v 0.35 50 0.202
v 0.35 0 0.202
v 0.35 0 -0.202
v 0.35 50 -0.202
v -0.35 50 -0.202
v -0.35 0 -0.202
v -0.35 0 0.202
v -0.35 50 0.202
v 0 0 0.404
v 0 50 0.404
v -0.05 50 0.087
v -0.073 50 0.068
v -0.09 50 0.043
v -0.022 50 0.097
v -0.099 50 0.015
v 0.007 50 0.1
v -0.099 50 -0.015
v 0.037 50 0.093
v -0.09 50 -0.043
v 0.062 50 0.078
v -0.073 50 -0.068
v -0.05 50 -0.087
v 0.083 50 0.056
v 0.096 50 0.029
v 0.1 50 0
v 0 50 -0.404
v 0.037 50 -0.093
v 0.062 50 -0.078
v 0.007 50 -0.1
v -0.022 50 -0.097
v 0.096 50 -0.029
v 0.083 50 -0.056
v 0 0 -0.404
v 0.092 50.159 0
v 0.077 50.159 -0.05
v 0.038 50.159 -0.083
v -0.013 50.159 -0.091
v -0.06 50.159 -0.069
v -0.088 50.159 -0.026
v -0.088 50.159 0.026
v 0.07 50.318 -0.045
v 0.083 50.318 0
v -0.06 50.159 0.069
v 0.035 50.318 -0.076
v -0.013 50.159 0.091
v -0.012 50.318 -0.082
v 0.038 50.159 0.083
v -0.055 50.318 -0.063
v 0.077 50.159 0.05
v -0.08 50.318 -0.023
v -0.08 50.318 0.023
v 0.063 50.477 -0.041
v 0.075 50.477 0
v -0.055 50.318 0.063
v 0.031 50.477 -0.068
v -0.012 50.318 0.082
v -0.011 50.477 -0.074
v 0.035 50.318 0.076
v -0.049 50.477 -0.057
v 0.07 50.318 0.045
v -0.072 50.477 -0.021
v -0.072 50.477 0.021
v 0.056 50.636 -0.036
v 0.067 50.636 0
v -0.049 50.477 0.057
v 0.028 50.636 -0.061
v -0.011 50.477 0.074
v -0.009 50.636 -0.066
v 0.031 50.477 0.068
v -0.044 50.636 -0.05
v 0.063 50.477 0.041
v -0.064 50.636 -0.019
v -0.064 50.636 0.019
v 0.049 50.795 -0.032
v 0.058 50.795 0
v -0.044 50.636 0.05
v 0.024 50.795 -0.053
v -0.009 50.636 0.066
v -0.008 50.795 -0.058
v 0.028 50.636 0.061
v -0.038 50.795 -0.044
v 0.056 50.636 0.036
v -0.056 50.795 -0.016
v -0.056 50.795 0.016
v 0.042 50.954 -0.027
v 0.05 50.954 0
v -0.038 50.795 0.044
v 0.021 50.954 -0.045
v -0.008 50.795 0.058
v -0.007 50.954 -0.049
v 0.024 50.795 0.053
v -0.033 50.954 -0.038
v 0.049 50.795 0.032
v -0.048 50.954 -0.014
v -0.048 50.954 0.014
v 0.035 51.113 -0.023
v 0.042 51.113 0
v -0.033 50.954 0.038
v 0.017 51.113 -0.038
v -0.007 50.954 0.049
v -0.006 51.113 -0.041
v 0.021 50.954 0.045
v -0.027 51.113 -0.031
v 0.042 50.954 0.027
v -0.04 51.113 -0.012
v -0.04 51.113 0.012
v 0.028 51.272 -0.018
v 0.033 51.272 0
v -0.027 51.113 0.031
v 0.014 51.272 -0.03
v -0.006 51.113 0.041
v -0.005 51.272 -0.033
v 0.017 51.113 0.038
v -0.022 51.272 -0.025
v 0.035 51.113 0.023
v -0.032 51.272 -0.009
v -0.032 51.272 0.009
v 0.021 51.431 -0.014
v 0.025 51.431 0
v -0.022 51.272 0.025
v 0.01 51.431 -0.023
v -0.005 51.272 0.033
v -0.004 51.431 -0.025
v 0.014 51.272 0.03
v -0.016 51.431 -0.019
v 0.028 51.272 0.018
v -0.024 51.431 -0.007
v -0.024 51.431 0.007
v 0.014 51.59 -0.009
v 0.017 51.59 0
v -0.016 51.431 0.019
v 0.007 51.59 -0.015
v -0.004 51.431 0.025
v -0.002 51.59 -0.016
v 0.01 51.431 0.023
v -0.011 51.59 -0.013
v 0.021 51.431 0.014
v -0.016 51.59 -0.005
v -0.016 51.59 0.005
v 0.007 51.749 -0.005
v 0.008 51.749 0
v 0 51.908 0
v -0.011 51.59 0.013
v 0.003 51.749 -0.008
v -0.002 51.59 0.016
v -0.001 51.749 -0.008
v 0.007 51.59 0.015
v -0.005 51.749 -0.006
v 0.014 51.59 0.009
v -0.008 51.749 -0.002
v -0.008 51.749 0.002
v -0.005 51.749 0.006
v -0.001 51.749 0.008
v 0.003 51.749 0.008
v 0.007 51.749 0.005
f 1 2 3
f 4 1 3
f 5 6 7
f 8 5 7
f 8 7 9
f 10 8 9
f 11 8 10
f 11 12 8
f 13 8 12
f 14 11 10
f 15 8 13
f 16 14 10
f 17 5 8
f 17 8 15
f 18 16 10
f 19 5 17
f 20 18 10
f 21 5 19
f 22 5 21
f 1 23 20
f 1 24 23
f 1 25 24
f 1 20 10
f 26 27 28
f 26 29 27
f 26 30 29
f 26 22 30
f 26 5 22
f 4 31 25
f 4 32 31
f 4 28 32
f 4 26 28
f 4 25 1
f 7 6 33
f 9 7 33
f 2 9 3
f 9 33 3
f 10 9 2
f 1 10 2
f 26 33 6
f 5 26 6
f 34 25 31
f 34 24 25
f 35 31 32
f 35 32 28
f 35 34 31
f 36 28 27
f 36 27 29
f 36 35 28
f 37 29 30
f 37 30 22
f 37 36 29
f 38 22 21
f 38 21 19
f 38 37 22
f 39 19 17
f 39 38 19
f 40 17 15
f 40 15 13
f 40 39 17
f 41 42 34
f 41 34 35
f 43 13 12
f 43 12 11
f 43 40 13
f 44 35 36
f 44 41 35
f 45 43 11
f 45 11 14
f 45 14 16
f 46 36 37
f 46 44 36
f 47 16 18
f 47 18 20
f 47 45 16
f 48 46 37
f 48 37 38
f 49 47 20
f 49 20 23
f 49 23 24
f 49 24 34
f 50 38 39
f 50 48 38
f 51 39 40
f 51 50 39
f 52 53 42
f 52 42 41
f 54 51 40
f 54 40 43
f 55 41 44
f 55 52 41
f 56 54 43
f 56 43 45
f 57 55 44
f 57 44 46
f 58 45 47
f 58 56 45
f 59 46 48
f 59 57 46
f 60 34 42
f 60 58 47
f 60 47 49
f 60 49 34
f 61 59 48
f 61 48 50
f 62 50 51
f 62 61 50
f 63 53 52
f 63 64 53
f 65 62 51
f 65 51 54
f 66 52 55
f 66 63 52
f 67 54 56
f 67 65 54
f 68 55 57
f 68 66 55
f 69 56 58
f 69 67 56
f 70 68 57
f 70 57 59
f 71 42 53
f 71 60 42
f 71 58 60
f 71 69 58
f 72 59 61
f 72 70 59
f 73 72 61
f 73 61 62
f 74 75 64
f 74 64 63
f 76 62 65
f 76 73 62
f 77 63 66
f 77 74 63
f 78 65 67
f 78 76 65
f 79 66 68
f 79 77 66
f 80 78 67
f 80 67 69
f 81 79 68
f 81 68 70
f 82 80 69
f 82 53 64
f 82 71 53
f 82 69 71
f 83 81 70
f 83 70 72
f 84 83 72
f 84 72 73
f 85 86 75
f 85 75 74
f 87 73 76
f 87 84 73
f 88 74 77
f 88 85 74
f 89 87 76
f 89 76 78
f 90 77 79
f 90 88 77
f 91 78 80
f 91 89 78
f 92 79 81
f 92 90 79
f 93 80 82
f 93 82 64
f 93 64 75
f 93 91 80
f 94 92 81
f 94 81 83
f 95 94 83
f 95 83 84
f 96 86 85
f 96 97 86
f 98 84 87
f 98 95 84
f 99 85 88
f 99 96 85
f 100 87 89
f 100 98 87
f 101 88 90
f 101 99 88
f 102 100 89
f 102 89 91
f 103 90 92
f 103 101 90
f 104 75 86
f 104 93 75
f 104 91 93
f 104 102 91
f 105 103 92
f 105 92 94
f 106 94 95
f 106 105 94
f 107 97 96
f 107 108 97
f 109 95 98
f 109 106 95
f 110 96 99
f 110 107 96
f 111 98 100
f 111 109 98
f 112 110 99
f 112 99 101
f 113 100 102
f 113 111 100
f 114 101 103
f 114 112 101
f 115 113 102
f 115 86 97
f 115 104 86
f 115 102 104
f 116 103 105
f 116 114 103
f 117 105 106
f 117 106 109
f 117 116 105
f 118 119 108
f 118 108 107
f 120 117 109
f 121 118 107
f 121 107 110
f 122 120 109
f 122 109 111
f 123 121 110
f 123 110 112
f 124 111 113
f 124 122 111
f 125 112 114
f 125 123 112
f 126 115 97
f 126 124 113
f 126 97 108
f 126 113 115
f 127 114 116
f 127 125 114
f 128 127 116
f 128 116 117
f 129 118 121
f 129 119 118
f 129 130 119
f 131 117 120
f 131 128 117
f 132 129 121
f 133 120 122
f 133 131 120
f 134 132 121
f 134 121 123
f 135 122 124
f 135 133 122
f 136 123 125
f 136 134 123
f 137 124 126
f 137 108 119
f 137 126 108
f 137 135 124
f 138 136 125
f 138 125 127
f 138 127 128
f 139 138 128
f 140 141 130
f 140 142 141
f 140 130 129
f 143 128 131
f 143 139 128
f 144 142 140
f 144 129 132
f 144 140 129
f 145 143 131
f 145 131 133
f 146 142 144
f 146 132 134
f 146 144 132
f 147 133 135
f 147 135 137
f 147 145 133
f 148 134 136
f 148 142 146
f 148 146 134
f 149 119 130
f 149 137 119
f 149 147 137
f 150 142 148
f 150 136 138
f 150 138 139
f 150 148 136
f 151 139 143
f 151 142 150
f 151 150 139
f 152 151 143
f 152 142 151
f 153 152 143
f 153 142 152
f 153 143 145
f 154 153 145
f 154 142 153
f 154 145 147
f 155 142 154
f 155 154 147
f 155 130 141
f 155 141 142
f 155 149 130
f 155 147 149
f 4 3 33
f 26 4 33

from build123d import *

# Parameters (mm, degrees)
P_IDAT_VYSUNUT_M1_DEPTH = 50


# Read off the part's stored shape, not the designer's step: Přidat vysunutím5
with BuildPart() as part:
    # Skica2 → Přidat vysunutím1 (new body)
    with BuildSketch(Plane(origin=(0, 0, 0), x_dir=(1, 0, 0), z_dir=(0, 1, 0))):
        Polygon((0, 0.404145188), (-0.35, 0.202072594), (-0.35, -0.202072594), (0, -0.404145188), (0.35, -0.202072594), (0.35, 0.202072594), align=None)
    extrude(amount=P_IDAT_VYSUNUT_M1_DEPTH)

    # Přidat vysunutím5 outline → Přidat vysunutím5 (revolve)
    with BuildSketch(Plane.XY):
        Polygon((0.1, 50), (0, 51.908113669), (0, 50), align=None)
    revolve(axis=Axis((0, 0, 0), (0, 1, 0)))


solid = part.part
